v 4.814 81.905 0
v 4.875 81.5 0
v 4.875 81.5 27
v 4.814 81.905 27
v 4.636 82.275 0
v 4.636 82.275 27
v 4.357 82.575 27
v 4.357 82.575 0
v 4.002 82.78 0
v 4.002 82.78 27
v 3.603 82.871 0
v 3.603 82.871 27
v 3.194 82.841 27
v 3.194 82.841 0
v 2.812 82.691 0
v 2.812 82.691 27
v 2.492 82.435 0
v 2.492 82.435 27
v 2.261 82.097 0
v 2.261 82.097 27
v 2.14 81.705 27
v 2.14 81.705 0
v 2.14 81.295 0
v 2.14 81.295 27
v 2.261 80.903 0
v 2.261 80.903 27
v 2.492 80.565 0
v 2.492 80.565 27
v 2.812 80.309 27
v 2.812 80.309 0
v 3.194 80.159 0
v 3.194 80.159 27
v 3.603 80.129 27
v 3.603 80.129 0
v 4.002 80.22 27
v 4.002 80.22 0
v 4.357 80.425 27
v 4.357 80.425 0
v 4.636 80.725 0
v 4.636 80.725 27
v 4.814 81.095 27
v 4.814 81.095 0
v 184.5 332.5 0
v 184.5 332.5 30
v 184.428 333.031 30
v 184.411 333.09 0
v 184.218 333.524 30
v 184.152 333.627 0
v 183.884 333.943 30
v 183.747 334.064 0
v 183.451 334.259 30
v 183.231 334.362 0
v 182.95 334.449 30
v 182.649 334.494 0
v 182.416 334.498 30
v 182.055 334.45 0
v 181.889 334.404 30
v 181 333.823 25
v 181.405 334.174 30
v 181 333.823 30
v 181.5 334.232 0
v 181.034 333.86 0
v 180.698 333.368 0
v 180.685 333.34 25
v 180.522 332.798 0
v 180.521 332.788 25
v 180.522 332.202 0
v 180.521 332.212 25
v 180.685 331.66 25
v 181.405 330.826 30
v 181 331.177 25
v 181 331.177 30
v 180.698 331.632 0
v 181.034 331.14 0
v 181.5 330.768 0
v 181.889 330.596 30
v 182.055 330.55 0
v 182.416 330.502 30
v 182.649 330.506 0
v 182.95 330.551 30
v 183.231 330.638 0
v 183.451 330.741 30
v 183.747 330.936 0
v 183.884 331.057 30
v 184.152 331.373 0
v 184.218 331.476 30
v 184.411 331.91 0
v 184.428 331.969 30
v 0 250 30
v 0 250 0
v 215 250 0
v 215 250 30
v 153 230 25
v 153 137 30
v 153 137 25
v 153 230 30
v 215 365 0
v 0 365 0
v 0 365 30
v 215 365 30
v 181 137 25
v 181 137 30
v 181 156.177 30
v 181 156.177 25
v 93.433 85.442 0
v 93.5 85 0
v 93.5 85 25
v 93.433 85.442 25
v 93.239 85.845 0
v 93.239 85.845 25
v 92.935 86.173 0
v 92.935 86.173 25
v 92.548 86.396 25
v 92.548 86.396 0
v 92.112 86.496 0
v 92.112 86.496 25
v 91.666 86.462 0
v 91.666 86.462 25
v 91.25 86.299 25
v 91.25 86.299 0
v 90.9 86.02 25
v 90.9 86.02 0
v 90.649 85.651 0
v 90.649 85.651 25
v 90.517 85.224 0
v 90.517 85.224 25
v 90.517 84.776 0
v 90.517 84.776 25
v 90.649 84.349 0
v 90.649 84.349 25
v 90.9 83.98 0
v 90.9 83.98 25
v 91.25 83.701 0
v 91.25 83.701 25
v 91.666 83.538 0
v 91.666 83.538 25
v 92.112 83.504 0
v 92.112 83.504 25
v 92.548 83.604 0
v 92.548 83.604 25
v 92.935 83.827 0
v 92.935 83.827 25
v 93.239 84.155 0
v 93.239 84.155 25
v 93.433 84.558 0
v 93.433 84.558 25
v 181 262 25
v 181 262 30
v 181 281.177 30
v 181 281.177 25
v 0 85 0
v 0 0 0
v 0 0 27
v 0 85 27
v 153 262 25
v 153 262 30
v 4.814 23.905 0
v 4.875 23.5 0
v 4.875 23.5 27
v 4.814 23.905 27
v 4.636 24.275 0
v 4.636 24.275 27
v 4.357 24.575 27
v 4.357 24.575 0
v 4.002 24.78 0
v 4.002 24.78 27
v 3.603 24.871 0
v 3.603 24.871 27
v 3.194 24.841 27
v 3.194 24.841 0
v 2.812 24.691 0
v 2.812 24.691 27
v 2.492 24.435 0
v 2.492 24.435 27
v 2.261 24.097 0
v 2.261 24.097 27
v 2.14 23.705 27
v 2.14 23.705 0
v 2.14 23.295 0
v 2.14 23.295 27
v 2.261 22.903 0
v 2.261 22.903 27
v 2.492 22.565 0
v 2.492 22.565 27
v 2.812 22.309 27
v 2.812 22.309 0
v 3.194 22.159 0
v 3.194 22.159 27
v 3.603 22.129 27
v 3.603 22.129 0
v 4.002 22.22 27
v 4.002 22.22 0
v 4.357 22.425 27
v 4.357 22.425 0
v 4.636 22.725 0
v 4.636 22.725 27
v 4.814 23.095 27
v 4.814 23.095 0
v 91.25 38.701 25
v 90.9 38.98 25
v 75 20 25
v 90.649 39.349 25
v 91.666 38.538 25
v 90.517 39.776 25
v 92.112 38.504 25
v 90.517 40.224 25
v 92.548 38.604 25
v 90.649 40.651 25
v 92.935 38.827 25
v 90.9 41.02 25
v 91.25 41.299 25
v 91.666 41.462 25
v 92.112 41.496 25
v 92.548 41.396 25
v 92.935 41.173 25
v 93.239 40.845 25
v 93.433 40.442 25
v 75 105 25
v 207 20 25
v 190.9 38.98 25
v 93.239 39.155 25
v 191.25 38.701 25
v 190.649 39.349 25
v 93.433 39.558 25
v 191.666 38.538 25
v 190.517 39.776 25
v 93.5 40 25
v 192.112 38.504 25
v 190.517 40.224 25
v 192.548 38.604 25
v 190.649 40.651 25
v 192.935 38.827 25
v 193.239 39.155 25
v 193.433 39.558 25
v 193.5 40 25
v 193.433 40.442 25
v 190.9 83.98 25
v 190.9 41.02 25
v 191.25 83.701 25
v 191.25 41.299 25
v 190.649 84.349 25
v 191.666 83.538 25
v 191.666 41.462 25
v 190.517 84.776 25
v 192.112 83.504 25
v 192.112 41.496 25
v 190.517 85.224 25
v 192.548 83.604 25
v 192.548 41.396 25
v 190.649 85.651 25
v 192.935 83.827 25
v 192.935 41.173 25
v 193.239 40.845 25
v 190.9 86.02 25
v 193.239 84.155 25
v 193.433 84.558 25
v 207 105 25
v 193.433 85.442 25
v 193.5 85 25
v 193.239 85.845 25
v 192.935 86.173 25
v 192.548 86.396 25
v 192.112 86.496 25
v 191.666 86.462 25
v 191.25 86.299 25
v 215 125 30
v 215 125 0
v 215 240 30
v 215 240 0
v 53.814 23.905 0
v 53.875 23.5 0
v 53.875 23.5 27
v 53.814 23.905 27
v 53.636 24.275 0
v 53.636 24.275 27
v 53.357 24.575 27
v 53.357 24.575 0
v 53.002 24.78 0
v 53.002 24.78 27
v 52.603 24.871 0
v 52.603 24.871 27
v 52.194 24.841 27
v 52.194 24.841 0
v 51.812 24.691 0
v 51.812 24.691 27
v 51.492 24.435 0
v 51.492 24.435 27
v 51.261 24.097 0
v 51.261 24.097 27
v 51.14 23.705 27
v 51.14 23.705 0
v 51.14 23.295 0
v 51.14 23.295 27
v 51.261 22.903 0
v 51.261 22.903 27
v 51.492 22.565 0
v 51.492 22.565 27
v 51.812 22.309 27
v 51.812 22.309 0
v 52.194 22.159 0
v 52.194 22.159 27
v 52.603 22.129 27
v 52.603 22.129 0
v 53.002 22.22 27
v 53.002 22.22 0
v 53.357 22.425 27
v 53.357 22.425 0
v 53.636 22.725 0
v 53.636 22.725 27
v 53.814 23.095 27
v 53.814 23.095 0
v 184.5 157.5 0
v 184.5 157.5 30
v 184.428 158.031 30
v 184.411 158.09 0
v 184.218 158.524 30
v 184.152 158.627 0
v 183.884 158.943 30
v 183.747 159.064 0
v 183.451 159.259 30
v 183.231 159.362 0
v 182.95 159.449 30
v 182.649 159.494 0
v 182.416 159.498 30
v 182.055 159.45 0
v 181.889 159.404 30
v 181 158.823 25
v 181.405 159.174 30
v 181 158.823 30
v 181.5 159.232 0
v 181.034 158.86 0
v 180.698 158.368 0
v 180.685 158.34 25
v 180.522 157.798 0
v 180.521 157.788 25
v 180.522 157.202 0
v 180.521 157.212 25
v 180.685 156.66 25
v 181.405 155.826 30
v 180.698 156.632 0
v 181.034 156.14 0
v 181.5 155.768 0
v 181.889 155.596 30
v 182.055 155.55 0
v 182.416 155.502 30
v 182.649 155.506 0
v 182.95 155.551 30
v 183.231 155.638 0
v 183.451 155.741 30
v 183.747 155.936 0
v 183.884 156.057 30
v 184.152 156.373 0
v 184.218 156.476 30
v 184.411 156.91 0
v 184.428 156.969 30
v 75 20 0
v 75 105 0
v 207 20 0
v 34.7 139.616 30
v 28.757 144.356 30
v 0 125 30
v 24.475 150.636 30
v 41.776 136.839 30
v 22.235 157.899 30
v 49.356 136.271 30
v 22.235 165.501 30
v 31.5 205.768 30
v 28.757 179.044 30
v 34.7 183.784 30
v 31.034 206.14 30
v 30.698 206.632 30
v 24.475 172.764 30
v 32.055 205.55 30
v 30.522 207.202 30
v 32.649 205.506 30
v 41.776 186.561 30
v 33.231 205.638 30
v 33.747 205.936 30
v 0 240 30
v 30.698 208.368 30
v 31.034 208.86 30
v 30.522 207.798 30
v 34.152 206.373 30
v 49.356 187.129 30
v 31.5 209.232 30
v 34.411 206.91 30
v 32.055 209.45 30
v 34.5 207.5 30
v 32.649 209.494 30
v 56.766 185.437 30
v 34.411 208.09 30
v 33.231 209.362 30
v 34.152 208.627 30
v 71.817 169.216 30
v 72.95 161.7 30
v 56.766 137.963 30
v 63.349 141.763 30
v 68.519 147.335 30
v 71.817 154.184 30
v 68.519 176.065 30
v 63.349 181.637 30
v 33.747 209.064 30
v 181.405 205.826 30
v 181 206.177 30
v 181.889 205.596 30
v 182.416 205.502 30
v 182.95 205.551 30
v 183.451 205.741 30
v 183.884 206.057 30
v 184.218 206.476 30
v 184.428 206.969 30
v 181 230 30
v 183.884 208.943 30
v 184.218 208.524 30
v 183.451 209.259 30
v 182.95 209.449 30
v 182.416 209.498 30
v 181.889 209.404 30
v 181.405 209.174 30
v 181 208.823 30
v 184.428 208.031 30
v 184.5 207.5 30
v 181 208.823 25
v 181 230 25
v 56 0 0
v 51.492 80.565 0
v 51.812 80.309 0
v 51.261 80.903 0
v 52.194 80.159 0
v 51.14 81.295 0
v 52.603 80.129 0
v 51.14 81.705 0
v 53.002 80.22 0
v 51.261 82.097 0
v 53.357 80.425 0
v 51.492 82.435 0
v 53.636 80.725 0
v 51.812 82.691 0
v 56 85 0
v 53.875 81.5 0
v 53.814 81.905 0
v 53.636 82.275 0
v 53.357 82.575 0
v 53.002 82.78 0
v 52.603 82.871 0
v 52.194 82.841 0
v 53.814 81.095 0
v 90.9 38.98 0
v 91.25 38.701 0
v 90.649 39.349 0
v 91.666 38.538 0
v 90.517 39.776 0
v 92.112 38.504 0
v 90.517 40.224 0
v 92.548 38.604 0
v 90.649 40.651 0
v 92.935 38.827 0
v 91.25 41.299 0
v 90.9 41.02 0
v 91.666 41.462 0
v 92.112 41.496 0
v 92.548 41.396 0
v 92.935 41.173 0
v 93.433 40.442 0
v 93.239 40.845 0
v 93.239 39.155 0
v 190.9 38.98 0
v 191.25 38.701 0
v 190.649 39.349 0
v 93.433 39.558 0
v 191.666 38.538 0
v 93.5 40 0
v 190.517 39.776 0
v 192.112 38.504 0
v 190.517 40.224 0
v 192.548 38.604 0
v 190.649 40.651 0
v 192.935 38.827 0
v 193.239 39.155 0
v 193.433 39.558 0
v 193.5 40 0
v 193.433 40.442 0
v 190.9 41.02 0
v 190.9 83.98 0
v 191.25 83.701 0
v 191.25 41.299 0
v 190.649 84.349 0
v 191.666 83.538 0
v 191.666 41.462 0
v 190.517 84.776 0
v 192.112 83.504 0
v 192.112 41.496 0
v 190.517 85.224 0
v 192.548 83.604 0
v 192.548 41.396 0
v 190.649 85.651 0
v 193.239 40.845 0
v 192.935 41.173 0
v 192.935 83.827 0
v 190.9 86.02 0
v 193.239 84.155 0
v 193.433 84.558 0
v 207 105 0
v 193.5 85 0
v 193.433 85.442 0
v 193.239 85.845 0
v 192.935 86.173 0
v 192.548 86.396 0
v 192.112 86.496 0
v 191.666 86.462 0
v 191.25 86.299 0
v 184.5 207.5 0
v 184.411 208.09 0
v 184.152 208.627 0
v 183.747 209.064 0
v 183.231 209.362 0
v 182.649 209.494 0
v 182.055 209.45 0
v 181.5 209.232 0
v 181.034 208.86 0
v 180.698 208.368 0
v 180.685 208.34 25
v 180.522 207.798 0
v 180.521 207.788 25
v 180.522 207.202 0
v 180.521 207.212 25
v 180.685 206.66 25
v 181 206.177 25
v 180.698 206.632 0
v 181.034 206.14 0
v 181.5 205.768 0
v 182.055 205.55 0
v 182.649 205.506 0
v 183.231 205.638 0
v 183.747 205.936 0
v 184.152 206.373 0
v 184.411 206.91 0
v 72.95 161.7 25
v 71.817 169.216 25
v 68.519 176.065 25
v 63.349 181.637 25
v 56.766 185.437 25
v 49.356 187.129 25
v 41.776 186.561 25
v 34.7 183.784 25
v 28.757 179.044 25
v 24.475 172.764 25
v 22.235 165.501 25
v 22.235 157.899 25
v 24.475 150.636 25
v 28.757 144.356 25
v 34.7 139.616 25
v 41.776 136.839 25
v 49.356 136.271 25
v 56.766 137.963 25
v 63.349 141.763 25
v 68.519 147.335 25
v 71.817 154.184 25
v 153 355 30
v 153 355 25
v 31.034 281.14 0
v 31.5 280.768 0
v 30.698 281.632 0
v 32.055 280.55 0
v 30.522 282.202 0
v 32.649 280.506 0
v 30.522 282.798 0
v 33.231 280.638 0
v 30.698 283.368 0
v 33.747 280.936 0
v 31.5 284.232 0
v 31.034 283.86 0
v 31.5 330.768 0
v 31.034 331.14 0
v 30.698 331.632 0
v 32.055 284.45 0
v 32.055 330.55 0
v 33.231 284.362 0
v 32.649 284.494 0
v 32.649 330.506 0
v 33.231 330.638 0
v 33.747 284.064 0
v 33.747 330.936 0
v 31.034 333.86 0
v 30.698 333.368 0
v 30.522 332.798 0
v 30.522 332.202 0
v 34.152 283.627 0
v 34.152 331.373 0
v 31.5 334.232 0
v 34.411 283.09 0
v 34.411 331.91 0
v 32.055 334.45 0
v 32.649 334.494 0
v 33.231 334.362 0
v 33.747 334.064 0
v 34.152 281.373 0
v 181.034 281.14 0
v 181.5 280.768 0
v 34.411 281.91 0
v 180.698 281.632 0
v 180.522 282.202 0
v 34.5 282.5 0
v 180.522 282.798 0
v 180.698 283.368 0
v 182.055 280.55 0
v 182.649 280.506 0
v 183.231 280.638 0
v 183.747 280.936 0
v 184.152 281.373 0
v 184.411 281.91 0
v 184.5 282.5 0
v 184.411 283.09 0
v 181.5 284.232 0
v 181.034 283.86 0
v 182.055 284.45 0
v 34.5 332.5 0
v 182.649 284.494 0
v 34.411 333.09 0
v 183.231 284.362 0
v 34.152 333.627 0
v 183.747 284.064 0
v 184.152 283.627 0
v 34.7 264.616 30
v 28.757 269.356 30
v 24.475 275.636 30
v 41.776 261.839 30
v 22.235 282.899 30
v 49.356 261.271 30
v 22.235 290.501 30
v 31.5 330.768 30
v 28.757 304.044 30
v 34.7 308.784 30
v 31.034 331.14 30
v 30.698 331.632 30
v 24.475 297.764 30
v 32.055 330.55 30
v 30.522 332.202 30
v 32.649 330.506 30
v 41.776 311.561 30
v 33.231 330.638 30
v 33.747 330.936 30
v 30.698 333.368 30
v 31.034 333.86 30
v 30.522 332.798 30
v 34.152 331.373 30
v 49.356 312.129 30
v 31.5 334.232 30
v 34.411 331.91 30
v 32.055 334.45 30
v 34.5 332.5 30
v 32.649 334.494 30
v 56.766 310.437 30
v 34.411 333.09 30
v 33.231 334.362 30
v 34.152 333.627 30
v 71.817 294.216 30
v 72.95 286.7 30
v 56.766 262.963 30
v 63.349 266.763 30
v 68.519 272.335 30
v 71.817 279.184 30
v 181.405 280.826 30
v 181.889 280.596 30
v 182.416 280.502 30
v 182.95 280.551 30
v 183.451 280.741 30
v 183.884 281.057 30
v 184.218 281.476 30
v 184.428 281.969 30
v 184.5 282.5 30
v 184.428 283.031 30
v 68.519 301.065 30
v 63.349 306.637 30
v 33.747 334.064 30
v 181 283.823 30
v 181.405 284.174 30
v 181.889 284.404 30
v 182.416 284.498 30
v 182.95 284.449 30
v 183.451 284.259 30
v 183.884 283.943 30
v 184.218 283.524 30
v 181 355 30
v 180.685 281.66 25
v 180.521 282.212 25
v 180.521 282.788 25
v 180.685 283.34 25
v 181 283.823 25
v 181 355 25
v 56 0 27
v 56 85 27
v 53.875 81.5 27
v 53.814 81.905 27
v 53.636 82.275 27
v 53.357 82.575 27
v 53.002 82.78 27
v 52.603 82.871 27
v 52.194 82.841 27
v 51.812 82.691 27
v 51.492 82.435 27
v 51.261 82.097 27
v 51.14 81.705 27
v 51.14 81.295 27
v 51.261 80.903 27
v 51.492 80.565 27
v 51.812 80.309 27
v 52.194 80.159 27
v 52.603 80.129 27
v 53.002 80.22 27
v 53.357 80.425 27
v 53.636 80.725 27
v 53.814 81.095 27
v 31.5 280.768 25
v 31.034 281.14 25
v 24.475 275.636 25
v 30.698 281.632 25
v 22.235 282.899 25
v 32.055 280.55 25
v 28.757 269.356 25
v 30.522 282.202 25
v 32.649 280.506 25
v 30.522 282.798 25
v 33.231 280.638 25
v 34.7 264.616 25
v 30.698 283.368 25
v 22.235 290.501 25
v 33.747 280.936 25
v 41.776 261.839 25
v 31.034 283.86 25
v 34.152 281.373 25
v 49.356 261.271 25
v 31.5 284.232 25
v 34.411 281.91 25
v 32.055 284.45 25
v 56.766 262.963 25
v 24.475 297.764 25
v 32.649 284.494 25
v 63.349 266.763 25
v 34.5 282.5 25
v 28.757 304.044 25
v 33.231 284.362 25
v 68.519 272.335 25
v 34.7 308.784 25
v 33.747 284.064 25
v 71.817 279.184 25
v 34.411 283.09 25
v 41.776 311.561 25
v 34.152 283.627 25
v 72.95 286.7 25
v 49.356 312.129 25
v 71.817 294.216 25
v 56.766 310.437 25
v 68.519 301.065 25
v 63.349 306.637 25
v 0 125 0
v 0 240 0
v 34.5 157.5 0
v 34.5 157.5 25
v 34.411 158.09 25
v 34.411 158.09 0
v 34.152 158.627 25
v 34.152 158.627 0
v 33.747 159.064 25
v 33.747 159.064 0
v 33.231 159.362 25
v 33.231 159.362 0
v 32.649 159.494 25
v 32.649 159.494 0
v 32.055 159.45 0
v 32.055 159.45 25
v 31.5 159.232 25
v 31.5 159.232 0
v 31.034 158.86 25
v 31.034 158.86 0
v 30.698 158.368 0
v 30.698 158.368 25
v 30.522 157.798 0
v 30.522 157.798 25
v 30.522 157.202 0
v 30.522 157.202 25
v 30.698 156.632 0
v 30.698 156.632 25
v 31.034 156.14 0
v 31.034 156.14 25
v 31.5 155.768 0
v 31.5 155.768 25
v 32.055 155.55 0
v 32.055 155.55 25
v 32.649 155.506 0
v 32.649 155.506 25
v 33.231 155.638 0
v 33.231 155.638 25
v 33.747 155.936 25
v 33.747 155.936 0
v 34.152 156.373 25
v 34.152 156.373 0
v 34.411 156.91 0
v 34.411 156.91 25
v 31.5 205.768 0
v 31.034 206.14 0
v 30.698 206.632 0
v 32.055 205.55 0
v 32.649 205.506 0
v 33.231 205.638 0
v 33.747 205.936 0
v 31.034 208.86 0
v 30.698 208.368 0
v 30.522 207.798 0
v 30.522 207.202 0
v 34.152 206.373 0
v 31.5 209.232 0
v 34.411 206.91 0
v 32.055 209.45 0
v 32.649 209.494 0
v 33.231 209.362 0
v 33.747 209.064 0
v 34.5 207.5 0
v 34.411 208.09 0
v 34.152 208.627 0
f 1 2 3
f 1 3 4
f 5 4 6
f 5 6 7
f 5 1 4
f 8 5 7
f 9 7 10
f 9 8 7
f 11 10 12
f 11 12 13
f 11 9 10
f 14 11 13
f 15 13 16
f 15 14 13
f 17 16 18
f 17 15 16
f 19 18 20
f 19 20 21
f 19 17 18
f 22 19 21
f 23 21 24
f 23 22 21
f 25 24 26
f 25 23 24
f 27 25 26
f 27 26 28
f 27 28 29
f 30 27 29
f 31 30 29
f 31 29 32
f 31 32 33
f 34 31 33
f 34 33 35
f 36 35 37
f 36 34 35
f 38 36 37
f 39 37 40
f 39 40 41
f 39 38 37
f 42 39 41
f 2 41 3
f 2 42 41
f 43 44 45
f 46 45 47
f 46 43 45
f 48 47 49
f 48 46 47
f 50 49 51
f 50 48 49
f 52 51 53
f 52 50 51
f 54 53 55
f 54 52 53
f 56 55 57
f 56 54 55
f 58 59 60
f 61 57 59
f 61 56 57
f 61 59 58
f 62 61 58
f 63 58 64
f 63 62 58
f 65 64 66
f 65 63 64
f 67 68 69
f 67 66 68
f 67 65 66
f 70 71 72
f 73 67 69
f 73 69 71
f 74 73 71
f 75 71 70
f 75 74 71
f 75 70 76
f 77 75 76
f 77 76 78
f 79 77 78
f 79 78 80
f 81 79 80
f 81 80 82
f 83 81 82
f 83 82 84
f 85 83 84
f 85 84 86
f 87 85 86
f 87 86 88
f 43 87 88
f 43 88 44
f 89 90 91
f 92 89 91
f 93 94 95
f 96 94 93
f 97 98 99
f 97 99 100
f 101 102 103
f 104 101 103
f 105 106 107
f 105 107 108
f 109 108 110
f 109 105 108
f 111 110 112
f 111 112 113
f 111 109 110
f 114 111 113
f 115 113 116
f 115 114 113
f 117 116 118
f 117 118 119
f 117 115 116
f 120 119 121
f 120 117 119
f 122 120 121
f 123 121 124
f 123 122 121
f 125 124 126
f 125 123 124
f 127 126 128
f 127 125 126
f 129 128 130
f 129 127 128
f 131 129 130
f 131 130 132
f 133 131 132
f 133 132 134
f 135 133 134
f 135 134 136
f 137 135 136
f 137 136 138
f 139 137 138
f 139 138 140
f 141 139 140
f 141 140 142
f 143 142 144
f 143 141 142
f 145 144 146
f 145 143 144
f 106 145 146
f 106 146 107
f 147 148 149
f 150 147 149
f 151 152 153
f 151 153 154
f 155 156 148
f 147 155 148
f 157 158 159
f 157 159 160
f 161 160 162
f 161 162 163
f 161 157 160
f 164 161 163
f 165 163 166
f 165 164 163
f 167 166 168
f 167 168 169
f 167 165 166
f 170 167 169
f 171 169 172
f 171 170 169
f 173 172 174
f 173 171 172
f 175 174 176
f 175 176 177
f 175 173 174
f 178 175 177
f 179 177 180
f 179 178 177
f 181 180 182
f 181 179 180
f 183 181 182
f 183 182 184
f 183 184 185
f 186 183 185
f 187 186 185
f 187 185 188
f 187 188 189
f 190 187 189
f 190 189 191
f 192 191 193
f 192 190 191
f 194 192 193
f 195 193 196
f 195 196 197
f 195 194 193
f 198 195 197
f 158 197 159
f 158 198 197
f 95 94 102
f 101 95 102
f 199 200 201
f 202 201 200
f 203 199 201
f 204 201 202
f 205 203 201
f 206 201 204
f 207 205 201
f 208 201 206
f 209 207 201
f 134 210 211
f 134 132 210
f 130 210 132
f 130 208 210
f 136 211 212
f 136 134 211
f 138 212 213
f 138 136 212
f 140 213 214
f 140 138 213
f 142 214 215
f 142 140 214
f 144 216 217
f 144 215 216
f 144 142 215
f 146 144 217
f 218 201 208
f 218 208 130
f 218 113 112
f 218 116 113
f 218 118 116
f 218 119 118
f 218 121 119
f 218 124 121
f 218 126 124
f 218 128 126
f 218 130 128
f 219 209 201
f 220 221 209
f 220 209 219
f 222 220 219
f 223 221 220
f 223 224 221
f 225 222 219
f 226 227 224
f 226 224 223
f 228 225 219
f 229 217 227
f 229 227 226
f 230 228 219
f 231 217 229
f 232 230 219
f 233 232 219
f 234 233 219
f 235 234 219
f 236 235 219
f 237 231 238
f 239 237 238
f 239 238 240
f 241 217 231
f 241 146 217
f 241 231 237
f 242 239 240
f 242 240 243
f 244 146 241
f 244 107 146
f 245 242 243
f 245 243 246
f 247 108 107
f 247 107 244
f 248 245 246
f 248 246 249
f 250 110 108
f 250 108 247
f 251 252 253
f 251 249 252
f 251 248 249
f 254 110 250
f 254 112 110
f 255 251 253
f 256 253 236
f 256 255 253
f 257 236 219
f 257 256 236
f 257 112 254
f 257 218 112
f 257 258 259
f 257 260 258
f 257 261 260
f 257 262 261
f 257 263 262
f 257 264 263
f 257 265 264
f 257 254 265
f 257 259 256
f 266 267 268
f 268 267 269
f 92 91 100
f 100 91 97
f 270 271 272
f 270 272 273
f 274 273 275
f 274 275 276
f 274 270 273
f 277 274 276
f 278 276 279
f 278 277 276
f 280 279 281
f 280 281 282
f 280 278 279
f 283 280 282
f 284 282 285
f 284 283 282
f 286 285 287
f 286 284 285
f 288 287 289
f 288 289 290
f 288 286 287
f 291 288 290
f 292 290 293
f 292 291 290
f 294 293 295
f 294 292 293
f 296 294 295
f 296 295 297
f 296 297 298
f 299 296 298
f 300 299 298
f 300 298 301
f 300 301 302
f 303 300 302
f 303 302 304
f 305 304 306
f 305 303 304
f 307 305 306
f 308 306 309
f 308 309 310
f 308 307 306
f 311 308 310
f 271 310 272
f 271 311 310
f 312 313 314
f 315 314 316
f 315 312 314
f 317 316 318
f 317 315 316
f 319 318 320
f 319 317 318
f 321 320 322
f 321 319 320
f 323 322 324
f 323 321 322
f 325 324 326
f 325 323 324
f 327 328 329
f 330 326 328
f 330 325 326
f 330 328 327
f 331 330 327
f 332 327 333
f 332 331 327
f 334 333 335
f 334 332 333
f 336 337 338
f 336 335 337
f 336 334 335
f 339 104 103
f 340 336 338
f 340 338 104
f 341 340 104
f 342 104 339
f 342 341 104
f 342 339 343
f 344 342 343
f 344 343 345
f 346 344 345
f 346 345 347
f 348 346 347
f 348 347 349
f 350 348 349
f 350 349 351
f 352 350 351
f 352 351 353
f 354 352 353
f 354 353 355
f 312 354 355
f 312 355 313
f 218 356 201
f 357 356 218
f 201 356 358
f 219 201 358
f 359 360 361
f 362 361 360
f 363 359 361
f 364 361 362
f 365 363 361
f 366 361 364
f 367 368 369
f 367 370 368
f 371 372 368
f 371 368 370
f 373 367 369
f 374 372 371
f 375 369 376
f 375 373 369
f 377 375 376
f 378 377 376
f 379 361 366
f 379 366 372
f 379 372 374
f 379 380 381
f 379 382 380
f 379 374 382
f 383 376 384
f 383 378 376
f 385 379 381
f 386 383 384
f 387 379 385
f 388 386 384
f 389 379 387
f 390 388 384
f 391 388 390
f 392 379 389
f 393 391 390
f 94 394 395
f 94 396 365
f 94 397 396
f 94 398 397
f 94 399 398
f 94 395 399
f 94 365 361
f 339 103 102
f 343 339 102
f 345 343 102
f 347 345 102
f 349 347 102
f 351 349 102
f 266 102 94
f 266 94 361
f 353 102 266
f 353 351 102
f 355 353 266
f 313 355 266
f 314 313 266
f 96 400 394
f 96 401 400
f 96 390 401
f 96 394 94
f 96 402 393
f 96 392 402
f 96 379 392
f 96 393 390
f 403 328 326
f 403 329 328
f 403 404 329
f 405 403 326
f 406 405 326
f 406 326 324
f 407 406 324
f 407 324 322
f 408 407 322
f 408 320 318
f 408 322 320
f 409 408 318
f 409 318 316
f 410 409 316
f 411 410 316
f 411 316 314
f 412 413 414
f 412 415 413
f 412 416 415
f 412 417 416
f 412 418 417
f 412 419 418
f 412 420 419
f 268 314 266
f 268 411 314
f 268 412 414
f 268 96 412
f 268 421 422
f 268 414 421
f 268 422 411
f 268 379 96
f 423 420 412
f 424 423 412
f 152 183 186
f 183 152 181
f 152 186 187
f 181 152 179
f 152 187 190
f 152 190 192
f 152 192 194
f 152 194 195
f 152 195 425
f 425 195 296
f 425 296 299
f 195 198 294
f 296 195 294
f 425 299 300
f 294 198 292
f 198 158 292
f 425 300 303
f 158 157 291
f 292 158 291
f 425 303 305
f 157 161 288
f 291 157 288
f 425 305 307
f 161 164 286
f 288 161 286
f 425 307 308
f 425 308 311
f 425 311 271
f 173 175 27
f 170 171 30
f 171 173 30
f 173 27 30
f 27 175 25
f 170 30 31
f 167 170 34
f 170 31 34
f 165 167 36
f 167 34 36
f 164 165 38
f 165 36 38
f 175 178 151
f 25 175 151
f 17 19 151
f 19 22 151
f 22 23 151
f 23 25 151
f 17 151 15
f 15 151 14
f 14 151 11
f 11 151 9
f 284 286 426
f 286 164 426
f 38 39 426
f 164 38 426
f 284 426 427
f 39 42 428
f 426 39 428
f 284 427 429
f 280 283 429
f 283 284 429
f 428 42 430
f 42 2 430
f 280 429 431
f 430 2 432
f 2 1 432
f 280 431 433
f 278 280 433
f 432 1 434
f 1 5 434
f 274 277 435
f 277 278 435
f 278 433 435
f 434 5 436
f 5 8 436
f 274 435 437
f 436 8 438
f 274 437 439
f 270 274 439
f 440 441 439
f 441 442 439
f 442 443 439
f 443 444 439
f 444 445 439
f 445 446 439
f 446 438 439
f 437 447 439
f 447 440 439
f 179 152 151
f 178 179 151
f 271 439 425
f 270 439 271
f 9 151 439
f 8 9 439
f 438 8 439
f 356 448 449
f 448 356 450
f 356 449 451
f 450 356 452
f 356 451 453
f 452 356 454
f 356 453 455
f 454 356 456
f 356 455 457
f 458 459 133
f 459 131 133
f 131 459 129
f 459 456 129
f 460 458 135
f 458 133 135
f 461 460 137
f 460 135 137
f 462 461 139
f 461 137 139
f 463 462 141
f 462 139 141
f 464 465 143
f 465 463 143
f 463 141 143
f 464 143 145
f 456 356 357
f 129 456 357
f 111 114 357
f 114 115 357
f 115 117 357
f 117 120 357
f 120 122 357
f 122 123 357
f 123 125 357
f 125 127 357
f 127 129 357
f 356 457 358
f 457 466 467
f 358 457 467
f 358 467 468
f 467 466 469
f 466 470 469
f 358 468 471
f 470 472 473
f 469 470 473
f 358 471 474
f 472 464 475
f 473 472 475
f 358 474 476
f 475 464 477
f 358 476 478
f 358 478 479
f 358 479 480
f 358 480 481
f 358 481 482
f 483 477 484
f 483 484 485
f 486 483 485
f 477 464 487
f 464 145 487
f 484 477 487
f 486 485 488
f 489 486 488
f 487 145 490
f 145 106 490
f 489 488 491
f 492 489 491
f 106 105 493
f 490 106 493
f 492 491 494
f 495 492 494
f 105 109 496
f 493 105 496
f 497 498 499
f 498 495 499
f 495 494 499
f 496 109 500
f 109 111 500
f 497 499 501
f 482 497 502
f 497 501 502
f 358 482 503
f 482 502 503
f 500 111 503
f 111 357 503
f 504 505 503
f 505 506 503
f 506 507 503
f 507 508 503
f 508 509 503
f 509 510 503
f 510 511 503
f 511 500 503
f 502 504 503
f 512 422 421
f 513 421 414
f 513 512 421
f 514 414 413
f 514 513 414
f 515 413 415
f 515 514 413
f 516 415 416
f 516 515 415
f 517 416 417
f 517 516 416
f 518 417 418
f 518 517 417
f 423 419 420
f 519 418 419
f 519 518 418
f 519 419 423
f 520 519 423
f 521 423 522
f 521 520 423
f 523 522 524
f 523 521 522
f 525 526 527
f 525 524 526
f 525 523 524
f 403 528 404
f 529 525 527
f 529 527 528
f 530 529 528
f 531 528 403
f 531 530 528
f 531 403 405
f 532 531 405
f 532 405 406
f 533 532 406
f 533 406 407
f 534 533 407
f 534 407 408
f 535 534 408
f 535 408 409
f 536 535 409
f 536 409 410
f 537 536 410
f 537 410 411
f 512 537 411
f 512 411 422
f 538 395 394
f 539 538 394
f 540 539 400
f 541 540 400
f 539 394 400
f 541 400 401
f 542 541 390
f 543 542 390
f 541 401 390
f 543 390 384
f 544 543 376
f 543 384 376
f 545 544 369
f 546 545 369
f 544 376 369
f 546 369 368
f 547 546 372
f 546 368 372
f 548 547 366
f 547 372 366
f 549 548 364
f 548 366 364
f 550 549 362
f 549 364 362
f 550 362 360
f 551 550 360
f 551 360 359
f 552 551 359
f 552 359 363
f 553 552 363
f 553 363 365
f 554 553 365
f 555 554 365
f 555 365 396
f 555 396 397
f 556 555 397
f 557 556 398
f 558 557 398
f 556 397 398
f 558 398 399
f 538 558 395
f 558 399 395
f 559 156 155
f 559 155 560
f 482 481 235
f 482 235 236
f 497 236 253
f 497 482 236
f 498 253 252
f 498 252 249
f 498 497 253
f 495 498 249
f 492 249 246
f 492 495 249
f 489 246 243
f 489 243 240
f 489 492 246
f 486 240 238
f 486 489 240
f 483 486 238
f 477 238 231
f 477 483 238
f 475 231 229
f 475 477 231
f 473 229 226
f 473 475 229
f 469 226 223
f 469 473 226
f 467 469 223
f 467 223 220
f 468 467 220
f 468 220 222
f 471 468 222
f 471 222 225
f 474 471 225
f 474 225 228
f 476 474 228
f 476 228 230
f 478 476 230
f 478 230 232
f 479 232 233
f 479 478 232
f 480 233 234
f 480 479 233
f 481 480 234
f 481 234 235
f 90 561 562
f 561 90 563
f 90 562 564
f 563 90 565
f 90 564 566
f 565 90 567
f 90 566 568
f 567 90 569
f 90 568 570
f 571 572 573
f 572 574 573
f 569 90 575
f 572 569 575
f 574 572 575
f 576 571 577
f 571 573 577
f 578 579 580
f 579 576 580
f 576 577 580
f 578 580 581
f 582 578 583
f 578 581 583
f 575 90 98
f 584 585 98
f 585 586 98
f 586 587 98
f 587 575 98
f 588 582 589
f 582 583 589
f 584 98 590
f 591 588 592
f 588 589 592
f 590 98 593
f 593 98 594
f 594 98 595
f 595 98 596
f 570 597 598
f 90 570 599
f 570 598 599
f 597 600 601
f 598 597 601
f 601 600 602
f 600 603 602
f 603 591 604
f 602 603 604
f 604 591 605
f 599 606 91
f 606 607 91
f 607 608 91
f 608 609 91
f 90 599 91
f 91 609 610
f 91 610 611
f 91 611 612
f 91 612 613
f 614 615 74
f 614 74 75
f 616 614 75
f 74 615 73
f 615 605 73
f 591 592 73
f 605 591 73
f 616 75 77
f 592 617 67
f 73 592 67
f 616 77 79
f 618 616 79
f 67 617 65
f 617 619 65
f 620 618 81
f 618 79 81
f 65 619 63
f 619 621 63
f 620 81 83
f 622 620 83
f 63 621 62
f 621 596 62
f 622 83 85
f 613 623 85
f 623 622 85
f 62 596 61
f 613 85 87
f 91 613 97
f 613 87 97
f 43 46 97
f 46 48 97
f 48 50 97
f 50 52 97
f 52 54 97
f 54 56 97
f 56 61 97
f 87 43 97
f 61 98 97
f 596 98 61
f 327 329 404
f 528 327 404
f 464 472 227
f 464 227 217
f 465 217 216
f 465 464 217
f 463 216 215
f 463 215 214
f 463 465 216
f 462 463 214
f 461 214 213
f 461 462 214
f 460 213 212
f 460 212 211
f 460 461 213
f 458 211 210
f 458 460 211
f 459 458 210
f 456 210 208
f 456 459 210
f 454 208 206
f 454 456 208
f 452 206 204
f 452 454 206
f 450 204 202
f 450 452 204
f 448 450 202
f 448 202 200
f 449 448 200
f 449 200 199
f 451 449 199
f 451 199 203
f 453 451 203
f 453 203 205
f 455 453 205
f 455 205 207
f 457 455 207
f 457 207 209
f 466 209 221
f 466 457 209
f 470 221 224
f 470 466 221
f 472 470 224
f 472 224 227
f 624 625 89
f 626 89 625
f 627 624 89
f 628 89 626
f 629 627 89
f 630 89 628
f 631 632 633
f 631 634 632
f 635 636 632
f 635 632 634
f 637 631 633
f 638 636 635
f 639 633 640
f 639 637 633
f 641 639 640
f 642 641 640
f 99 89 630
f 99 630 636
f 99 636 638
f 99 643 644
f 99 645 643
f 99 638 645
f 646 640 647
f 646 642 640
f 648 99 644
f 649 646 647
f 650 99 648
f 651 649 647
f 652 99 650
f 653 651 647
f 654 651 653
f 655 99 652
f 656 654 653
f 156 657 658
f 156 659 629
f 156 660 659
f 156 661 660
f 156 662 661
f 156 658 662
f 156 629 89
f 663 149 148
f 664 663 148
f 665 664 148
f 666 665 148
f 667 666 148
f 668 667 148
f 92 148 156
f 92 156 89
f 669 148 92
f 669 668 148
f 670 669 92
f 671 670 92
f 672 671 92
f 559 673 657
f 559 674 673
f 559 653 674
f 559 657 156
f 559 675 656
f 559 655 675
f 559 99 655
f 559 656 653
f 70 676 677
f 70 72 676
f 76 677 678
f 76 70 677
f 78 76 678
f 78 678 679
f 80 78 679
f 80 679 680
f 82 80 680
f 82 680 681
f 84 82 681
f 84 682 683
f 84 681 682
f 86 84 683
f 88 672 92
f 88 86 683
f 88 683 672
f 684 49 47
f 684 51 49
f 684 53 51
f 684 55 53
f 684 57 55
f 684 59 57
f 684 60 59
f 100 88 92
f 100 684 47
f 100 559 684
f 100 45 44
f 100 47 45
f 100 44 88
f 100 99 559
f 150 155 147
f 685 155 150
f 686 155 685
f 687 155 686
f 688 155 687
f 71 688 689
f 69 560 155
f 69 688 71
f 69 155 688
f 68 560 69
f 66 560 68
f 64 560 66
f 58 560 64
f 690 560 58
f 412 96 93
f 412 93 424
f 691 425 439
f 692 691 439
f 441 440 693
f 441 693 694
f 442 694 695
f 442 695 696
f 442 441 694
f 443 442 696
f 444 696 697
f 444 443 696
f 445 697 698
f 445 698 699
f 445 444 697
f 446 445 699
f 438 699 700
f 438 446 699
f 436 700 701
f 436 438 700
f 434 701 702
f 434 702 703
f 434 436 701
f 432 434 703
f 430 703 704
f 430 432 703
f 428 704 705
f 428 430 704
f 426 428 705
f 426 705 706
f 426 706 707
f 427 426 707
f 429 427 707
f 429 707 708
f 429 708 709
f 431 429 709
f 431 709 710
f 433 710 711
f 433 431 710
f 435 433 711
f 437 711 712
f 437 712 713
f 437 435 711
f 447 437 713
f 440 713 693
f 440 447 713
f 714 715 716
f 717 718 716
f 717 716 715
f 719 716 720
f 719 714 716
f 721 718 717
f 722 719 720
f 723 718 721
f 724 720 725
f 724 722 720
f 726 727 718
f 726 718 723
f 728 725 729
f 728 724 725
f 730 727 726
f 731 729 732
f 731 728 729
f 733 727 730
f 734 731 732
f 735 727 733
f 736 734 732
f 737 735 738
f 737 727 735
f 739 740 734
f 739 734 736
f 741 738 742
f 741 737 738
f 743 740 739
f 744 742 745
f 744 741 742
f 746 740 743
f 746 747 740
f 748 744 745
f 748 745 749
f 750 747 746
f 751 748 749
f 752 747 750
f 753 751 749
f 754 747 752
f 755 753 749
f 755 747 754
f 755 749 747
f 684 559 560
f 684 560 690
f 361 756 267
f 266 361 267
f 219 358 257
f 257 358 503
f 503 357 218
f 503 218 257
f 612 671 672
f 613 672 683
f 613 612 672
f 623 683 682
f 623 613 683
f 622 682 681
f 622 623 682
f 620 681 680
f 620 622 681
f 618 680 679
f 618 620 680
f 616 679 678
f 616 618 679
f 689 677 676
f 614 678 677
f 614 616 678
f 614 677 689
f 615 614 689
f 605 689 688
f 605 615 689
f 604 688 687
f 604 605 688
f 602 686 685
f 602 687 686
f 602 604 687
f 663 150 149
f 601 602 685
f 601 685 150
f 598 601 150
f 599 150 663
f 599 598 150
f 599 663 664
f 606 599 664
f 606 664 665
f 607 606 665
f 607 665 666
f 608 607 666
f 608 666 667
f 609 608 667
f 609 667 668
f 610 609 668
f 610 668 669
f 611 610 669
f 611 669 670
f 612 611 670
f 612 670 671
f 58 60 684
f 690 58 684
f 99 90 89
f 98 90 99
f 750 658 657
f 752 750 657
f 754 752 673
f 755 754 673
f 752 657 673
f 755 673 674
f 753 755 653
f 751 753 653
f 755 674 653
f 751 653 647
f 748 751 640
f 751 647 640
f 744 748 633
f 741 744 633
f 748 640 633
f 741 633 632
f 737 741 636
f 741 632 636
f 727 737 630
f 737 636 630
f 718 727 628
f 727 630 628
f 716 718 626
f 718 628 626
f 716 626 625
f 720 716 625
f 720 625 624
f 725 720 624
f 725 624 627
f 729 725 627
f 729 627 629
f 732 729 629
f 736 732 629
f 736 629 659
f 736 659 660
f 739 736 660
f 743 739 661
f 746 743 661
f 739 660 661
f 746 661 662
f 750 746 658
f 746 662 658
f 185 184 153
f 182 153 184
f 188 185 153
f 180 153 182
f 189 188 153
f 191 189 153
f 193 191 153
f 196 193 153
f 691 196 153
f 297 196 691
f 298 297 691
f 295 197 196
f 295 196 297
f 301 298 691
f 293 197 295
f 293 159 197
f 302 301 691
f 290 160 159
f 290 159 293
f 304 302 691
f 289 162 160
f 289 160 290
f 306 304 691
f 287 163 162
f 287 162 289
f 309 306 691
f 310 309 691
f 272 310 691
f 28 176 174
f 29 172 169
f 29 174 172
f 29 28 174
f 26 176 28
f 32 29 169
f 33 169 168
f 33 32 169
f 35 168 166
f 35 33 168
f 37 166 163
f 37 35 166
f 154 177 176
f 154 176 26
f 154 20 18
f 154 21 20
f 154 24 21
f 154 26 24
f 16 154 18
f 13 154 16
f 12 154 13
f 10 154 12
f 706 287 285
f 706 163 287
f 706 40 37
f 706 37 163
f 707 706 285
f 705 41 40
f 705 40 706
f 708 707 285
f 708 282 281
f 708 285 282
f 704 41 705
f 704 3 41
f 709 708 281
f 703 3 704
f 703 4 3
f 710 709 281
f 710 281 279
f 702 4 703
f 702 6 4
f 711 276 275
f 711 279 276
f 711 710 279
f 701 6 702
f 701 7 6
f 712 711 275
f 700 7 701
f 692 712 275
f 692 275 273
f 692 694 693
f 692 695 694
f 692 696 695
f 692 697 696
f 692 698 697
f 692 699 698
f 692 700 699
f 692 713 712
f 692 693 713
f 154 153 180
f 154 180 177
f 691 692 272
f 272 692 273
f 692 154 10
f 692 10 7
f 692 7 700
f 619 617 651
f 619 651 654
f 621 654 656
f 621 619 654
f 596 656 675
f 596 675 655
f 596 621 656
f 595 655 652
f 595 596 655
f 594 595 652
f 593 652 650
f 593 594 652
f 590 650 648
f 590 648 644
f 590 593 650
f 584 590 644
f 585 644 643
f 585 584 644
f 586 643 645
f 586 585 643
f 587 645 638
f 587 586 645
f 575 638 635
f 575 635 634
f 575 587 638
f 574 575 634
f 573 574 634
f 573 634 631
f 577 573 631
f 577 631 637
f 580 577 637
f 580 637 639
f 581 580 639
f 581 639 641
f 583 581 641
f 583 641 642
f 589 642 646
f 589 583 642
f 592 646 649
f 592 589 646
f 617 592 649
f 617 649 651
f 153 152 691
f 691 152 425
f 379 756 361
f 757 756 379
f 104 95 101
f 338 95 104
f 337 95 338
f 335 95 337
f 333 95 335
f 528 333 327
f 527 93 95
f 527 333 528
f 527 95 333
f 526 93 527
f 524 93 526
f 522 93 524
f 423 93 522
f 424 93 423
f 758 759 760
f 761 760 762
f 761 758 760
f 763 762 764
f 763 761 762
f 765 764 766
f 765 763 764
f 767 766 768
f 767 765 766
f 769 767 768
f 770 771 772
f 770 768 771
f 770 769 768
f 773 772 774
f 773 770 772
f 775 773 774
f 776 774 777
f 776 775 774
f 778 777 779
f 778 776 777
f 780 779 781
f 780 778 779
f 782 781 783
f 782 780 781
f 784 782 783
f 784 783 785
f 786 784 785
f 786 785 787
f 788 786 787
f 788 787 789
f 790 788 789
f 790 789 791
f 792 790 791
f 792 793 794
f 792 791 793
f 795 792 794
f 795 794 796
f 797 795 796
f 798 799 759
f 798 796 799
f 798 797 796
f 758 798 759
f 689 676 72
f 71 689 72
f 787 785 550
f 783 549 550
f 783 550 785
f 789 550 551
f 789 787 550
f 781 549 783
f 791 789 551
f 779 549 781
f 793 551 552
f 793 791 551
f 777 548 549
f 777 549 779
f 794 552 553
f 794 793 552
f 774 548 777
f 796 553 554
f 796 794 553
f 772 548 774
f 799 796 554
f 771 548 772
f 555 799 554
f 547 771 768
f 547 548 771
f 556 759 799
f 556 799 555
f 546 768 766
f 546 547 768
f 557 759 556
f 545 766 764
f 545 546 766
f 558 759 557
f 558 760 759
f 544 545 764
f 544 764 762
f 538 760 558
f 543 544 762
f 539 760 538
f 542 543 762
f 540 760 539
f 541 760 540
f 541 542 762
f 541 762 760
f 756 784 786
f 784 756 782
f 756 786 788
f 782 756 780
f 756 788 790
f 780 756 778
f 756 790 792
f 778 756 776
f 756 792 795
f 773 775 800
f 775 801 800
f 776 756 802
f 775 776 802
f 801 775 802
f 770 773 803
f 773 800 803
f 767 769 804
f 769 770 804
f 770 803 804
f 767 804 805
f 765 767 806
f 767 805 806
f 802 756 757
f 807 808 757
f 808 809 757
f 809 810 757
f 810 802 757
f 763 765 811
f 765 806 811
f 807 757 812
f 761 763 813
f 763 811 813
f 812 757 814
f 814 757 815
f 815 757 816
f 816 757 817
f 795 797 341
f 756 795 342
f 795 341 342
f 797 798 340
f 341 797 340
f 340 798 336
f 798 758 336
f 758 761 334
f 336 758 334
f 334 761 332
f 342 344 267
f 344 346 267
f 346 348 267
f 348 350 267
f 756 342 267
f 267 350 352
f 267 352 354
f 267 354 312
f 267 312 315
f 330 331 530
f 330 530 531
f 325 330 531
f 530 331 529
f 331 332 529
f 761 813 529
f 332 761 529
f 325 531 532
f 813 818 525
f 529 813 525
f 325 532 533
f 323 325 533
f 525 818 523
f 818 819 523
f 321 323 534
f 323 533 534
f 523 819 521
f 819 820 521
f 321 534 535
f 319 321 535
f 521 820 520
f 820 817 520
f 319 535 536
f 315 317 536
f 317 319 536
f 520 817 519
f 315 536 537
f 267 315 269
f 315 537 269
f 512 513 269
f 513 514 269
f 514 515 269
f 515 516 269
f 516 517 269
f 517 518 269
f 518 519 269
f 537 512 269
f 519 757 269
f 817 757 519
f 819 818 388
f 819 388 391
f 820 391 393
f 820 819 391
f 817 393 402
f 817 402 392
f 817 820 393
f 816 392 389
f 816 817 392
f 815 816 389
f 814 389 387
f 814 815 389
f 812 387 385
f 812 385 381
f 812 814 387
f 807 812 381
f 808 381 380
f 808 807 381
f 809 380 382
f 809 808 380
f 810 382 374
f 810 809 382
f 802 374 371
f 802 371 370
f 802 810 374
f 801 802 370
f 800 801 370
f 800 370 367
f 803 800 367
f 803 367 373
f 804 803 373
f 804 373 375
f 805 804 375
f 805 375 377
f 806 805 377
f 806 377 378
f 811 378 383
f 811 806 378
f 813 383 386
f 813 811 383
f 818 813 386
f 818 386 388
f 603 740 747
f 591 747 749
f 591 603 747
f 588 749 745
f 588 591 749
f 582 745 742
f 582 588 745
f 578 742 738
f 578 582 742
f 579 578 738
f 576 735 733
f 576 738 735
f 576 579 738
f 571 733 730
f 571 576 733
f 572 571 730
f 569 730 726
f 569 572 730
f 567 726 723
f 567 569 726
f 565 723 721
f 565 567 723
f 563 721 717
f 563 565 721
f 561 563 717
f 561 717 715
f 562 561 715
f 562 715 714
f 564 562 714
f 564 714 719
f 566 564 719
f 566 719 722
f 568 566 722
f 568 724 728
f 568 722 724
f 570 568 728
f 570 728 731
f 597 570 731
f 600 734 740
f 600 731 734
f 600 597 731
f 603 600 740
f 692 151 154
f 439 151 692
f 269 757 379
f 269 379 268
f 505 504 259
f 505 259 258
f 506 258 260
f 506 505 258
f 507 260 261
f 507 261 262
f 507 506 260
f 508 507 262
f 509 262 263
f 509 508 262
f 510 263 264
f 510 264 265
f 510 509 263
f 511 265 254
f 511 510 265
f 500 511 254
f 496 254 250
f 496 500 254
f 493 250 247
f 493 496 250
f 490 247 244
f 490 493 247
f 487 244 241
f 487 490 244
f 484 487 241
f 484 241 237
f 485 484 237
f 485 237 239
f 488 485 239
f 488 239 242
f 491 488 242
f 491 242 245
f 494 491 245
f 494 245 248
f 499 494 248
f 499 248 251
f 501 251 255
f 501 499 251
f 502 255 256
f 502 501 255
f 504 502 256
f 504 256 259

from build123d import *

# Parameters (mm, degrees)
SKETCH_W        = 56
SKETCH_H        = 85
SKETCH_R        = 1.375
PAD_DEPTH       = 27
SKETCH001_W     = 132
SKETCH001_H     = 85
SKETCH001_R     = 1.5
PAD001_DEPTH    = 25
SKETCH002_W     = 215
SKETCH002_H     = 115
SKETCH002_R     = 2
PAD002_DEPTH    = 30
SKETCH003_R     = 25.5
SKETCH003_W     = 28
SKETCH003_H     = 93
POCKET_DEPTH    = 5
SKETCH004_W     = 215
SKETCH004_H     = 115
SKETCH004_R     = 2
PAD003_DEPTH    = 30
SKETCH005_R     = 25.5
SKETCH005_W     = 28
SKETCH005_H     = 93
POCKET001_DEPTH = 5


with BuildPart() as pi3b:
    # Sketch → Pad (new body)
    with BuildSketch(Plane.XY):
        with Locations((28, 42.5)):
            Rectangle(SKETCH_W, SKETCH_H)
        with Locations((3.5, 81.5)):
            Circle(SKETCH_R, mode=Mode.SUBTRACT)
        with Locations((52.5, 81.5)):
            Circle(SKETCH_R, mode=Mode.SUBTRACT)
        with Locations((3.5, 23.5)):
            Circle(SKETCH_R, mode=Mode.SUBTRACT)
        with Locations((52.5, 23.5)):
            Circle(SKETCH_R, mode=Mode.SUBTRACT)
    extrude(amount=PAD_DEPTH)


with BuildPart() as driverboard:
    # Sketch001 → Pad001 (new body)
    with BuildSketch(Plane.XY):
        with Locations((141, 62.5)):
            Rectangle(SKETCH001_W, SKETCH001_H)
        with Locations((92, 85)):
            Circle(SKETCH001_R, mode=Mode.SUBTRACT)
        with Locations((192, 85)):
            Circle(SKETCH001_R, mode=Mode.SUBTRACT)
        with Locations((92, 40)):
            Circle(SKETCH001_R, mode=Mode.SUBTRACT)
        with Locations((192, 40)):
            Circle(SKETCH001_R, mode=Mode.SUBTRACT)
    extrude(amount=PAD001_DEPTH)


with BuildPart() as mw_lrs_350_5_a:
    # Sketch002 → Pad002 (new body)
    with BuildSketch(Plane.XY):
        with Locations((107.5, 182.5)):
            Rectangle(SKETCH002_W, SKETCH002_H)
        with Locations((32.5, 207.5)):
            Circle(SKETCH002_R, mode=Mode.SUBTRACT)
        with Locations((182.5, 207.5)):
            Circle(SKETCH002_R, mode=Mode.SUBTRACT)
        with Locations((182.5, 157.5)):
            Circle(SKETCH002_R, mode=Mode.SUBTRACT)
        with Locations((32.5, 157.5)):
            Circle(SKETCH002_R, mode=Mode.SUBTRACT)
    extrude(amount=PAD002_DEPTH)

    # Sketch003 (on Face10 of Pad002) → Pocket (cut)
    with BuildSketch(Plane.XY.offset(30)):
        with Locations((47.45, 161.7)):
            Circle(SKETCH003_R)
        with Locations((167, 183.5)):
            Rectangle(SKETCH003_W, SKETCH003_H)
    extrude(amount=-POCKET_DEPTH, mode=Mode.SUBTRACT)


with BuildPart() as mw_lrs_350_5_b:
    # Sketch004 → Pad003 (new body)
    with BuildSketch(Plane.XY):
        with Locations((107.5, 307.5)):
            Rectangle(SKETCH004_W, SKETCH004_H)
        with Locations((32.5, 332.5)):
            Circle(SKETCH004_R, mode=Mode.SUBTRACT)
        with Locations((182.5, 332.5)):
            Circle(SKETCH004_R, mode=Mode.SUBTRACT)
        with Locations((182.5, 282.5)):
            Circle(SKETCH004_R, mode=Mode.SUBTRACT)
        with Locations((32.5, 282.5)):
            Circle(SKETCH004_R, mode=Mode.SUBTRACT)
    extrude(amount=PAD003_DEPTH)

    # Sketch005 (on Face10 of Pad003) → Pocket001 (cut)
    with BuildSketch(Plane.XY.offset(30)):
        with Locations((47.45, 286.7)):
            Circle(SKETCH005_R)
        with Locations((167, 308.5)):
            Rectangle(SKETCH005_W, SKETCH005_H)
    extrude(amount=-POCKET001_DEPTH, mode=Mode.SUBTRACT)


solid = Compound([pi3b.part, driverboard.part, mw_lrs_350_5_a.part, mw_lrs_350_5_b.part])
